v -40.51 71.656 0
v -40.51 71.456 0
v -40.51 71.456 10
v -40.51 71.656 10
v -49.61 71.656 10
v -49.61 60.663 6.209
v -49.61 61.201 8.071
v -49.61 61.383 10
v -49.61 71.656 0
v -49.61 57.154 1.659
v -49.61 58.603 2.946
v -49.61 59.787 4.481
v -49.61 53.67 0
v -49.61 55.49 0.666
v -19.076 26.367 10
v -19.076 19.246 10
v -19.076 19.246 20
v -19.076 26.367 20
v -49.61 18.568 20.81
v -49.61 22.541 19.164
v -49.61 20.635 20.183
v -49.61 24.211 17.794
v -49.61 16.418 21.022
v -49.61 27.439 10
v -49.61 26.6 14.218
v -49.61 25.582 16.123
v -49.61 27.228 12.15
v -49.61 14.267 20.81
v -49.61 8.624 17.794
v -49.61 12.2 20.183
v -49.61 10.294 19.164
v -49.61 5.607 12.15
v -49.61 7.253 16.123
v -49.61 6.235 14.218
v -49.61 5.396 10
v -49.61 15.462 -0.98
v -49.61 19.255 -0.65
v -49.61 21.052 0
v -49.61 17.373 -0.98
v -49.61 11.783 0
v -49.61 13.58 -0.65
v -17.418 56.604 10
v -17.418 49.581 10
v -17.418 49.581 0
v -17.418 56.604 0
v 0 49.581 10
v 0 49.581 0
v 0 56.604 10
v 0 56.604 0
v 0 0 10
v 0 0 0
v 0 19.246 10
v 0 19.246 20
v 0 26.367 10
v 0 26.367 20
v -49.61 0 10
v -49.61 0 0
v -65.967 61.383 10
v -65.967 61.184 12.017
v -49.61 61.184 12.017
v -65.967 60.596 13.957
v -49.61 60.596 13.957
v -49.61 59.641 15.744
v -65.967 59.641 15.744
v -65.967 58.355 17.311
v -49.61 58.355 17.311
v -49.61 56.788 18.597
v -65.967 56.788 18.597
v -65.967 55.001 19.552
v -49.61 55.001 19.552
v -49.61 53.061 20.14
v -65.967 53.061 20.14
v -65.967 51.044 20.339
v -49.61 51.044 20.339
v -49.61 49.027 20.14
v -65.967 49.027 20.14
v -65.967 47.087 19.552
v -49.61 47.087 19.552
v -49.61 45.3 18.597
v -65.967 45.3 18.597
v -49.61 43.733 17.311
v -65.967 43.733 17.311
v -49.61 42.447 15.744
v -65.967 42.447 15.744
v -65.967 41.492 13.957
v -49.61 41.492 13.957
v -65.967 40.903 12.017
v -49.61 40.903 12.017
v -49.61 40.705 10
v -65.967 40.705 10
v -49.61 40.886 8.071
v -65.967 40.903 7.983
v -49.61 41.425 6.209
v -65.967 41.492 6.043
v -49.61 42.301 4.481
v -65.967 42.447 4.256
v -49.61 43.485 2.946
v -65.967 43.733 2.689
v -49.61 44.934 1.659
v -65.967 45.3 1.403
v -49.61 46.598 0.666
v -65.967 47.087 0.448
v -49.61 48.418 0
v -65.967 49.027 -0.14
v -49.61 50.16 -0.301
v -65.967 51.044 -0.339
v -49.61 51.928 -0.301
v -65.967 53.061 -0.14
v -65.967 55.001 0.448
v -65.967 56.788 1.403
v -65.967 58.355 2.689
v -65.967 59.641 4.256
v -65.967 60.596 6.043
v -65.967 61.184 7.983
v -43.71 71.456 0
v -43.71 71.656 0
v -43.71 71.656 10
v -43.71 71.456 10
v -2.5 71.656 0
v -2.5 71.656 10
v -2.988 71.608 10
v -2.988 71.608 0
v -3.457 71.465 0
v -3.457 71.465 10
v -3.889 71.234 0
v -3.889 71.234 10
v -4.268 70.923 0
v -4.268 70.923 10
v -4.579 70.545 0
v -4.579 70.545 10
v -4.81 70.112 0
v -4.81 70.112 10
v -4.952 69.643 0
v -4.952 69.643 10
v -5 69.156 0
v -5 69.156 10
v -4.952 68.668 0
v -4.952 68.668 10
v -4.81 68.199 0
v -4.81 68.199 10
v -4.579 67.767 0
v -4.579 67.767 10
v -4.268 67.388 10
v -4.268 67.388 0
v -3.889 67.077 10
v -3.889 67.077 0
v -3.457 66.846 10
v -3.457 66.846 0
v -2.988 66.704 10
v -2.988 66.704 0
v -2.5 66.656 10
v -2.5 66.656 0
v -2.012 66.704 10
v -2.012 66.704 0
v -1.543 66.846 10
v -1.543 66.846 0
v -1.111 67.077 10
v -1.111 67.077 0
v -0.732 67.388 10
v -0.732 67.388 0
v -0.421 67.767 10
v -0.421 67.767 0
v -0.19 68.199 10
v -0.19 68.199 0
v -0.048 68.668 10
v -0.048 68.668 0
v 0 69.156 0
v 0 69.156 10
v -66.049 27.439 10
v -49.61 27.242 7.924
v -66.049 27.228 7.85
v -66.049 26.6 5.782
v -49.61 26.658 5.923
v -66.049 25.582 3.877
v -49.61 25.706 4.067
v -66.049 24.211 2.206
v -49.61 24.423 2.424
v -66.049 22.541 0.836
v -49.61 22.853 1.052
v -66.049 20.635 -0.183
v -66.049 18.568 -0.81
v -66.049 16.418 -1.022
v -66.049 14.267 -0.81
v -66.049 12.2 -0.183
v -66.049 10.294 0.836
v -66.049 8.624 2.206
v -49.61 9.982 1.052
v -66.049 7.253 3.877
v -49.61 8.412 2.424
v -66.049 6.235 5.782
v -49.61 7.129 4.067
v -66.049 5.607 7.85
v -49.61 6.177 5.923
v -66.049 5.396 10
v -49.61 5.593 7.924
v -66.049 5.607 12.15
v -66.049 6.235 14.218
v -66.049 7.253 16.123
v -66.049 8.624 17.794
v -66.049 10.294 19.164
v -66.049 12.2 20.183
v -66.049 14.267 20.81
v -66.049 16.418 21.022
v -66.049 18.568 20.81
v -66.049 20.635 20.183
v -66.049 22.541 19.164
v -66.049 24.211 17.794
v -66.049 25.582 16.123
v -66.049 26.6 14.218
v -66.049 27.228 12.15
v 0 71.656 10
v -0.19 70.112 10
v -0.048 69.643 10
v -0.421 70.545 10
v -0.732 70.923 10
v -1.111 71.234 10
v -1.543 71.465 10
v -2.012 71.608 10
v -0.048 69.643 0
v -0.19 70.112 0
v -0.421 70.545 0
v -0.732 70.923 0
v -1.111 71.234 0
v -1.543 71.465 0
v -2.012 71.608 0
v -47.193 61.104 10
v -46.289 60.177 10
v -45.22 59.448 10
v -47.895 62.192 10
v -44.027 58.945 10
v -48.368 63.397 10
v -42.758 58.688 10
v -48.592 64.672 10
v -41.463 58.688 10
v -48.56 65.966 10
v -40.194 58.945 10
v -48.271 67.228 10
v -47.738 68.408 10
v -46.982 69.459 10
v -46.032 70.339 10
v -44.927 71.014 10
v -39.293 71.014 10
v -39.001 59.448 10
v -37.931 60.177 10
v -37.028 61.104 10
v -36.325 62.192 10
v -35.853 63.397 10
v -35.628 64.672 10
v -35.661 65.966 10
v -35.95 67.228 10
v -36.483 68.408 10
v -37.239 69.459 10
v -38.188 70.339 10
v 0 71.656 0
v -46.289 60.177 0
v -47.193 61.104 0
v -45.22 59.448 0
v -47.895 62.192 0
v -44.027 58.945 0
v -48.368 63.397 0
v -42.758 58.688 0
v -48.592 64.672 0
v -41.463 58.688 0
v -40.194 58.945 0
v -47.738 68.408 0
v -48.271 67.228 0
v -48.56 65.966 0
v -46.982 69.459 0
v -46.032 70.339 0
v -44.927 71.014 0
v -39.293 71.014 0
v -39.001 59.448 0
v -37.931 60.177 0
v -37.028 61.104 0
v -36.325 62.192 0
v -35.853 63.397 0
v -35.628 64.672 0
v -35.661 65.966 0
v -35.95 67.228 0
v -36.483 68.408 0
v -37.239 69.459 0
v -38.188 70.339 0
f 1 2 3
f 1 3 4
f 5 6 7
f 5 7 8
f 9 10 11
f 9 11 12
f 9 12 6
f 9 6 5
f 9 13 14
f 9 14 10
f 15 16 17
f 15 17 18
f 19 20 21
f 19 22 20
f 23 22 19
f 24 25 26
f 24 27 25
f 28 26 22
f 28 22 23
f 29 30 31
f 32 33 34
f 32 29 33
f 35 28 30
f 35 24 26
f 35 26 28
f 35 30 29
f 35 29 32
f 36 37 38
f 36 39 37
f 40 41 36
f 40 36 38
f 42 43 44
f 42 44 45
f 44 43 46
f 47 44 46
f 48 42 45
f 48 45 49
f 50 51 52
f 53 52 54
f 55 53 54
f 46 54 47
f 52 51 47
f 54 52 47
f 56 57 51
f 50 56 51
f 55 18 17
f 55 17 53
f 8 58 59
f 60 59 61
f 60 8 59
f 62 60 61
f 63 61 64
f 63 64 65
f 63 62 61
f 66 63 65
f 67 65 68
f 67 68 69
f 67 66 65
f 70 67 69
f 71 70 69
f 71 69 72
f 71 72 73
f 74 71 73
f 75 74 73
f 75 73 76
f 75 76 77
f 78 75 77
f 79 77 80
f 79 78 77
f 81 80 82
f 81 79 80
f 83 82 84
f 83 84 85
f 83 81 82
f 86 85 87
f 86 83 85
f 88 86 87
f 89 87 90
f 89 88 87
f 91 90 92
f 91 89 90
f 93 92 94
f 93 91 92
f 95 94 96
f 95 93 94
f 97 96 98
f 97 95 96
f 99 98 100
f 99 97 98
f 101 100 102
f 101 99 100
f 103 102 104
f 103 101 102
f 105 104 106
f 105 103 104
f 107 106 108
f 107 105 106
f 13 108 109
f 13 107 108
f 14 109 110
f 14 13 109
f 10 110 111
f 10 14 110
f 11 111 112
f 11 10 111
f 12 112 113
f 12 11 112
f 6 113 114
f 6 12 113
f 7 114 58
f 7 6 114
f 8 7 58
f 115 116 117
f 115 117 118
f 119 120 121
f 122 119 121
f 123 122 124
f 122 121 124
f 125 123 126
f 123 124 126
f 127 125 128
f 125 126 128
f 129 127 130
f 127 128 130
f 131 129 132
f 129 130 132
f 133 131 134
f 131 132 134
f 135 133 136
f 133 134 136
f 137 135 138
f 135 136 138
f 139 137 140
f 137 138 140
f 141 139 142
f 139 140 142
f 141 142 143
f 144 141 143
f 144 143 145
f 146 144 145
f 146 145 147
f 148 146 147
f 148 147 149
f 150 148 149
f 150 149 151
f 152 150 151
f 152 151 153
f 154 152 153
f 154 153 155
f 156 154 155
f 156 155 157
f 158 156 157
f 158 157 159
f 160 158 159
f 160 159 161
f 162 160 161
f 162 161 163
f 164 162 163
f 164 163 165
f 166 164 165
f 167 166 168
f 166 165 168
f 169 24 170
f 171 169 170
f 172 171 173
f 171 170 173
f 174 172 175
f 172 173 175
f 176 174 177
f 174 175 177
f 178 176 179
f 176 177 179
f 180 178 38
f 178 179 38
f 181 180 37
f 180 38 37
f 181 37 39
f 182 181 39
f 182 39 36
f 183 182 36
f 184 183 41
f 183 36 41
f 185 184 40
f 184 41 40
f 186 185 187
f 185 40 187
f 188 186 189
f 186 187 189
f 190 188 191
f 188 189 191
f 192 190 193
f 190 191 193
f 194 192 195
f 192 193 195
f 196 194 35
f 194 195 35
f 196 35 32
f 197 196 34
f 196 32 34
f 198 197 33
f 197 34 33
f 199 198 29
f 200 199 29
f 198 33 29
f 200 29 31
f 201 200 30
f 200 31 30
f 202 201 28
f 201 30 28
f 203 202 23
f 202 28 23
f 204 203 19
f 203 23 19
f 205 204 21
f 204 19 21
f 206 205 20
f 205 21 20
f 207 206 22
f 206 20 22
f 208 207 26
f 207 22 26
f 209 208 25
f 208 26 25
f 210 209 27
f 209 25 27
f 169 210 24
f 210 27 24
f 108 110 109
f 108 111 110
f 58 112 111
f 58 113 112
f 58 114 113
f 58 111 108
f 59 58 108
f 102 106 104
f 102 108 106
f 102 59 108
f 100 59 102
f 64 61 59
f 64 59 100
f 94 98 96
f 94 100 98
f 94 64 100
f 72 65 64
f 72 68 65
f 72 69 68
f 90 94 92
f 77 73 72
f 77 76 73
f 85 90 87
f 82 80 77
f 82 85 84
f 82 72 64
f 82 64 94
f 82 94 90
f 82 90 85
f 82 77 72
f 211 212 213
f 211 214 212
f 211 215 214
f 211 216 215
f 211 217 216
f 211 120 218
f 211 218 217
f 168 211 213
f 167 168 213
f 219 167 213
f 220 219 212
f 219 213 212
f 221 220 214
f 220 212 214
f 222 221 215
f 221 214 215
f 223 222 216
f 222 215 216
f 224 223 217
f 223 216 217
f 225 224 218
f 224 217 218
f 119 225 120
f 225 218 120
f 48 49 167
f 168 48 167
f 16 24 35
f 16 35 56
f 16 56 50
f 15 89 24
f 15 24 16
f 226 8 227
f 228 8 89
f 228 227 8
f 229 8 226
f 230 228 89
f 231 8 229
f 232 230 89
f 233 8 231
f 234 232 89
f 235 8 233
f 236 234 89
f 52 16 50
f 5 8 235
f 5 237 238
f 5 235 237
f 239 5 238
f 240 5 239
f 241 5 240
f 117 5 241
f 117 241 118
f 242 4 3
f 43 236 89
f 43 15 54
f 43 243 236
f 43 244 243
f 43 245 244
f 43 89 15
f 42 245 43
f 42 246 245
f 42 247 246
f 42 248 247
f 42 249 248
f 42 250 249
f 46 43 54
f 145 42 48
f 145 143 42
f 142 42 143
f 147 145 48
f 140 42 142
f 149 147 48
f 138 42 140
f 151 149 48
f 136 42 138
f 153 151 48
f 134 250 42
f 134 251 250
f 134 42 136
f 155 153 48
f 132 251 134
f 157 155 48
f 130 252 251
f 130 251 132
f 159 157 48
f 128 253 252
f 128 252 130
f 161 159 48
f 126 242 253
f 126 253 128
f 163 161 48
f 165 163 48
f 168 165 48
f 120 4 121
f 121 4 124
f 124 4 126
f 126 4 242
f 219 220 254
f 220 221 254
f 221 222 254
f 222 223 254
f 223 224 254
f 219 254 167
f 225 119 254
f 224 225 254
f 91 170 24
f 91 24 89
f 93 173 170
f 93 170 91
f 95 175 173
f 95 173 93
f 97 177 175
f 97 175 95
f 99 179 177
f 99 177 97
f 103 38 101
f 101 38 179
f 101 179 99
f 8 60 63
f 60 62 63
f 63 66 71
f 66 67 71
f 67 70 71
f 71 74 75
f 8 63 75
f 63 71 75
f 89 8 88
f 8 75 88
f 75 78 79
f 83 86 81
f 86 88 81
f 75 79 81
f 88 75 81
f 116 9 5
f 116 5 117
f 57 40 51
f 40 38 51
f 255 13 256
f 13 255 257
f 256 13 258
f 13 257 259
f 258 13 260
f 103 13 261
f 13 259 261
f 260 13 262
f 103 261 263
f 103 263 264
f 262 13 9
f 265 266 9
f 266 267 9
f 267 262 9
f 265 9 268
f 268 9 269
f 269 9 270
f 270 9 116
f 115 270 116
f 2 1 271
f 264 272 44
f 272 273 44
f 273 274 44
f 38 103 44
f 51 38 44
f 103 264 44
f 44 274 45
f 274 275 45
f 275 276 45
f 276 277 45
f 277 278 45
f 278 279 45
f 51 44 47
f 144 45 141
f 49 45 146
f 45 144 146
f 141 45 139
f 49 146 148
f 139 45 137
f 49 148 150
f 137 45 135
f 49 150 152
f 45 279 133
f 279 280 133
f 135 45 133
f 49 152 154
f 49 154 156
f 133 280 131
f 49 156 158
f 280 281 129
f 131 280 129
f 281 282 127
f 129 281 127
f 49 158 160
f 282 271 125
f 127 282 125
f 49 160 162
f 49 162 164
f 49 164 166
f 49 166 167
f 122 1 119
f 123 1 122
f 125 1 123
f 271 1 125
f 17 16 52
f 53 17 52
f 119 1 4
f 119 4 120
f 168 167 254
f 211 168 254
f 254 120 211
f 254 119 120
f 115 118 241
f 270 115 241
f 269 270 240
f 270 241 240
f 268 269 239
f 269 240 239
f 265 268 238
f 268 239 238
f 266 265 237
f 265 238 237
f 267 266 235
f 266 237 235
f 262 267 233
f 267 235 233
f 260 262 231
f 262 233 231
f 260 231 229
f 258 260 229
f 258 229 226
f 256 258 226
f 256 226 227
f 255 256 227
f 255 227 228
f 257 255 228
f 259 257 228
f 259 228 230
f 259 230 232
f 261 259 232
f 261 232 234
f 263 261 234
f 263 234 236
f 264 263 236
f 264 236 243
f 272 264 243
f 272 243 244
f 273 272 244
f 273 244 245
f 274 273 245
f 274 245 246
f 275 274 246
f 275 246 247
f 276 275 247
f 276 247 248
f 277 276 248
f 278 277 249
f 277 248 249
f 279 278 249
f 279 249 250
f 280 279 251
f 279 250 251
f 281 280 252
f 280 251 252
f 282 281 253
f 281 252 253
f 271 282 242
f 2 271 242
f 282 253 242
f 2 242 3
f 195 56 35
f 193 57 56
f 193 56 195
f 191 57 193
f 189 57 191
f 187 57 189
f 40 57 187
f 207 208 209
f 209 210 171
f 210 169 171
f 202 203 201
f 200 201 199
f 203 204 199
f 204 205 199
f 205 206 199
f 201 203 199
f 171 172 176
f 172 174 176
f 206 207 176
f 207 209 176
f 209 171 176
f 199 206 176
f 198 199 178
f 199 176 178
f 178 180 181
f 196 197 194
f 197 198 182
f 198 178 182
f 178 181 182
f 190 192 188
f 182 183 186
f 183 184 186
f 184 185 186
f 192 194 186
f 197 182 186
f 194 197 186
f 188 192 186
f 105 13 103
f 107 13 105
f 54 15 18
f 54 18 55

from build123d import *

# Parameters (mm, degrees)
SKETCH_1_W          = 49.610297338
SKETCH_1_H          = 71.655608821
EXTRUDE_1_DEPTH     = 10
SKETCH_2_W          = 16.35634768
SKETCH_2_H          = 10.339143633
SKETCH_3_W          = 16.438776978
SKETCH_3_H          = 11.021917269
SKETCH_4_W          = 17.418282618
SKETCH_4_H          = 7.022814543
CUT_EXTRUDE_1_DEPTH = 10
SKETCH_4_3_W        = 19.076447163
SKETCH_4_3_H        = 7.120353633
EXTRUDE_2_DEPTH     = 10
CUT_EXTRUDE_3_DEPTH = 99.073896393
SKETCH_6_R          = 2.5
CUT_EXTRUDE_4_DEPTH = 99.073896393


with BuildPart() as part:
    # 草图1 → 凸台-拉伸1 (new body)
    with BuildSketch(Plane.XY):
        with Locations((-24.805148669, 35.827804411)):
            Rectangle(SKETCH_1_W, SKETCH_1_H)
    extrude(amount=EXTRUDE_1_DEPTH)

    # 草图2 → 旋转1 (revolve)
    with BuildSketch(Plane.XY.offset(10)):
        with Locations((-57.788471178, 56.213474404)):
            Rectangle(SKETCH_2_W, SKETCH_2_H)
    revolve(axis=Axis((-65.966645018, 51.043902587, 10), (1, 0, 0)))

    # 草图3 → 旋转2 (revolve)
    with BuildSketch(Plane.XY.offset(10)):
        with Locations((-57.829685827, 21.928483961)):
            Rectangle(SKETCH_3_W, SKETCH_3_H)
    revolve(axis=Axis((-49.610297338, 16.417525326, 10), (-1, 0, 0)))

    # 草图4 → 切除-拉伸1 (cut)
    with BuildSketch(Plane.XY.offset(10)):
        with Locations((-8.709141309, 53.092223496)):
            Rectangle(SKETCH_4_W, SKETCH_4_H)
    extrude(amount=-CUT_EXTRUDE_1_DEPTH, mode=Mode.SUBTRACT)

    # 草图4<3> → 凸台-拉伸2 (add)
    with BuildSketch(Plane.XY.offset(10)):
        with Locations((-9.538223582, 22.806335779)):
            Rectangle(SKETCH_4_3_W, SKETCH_4_3_H)
    extrude(amount=EXTRUDE_2_DEPTH)

    # 草图5 → 切除-拉伸3 (cut, through all)
    with BuildSketch(Plane.XY.offset(10)):
        with BuildLine():
            Line((-43.710297338, 71.655608821), (-43.710297338, 71.455608821))
            ThreePointArc((-43.710297338, 71.455608821), (-42.110297338, 58.655608821), (-40.510297338, 71.455608821))
            Line((-40.510297338, 71.455608821), (-40.510297338, 71.655608821))
            Line((-40.510297338, 71.655608821), (-43.710297338, 71.655608821))
        make_face()
    extrude(amount=-CUT_EXTRUDE_3_DEPTH, mode=Mode.SUBTRACT)

    # 草图6 → 切除-拉伸4 (cut, through all)
    with BuildSketch(Plane.XY.offset(10)):
        with Locations((-2.5, 69.155608821)):
            Circle(SKETCH_6_R)
    extrude(amount=-CUT_EXTRUDE_4_DEPTH, mode=Mode.SUBTRACT)


with BuildPart() as cut_extrude_4_piece_1:
    # of the separate pieces the step leaves, piece 1, a body of its own (cut_extrude_4_pieces)
    add(part.part.solids().sort_by_distance((0, 0, 0))[0])


with BuildPart() as cut_extrude_4_piece_2:
    # of the separate pieces the step leaves, piece 2, a body of its own (cut_extrude_4_pieces)
    add(part.part.solids().sort_by_distance((0, 71.655608821, 0))[0])


solid = Compound([cut_extrude_4_piece_1.part, cut_extrude_4_piece_2.part])
